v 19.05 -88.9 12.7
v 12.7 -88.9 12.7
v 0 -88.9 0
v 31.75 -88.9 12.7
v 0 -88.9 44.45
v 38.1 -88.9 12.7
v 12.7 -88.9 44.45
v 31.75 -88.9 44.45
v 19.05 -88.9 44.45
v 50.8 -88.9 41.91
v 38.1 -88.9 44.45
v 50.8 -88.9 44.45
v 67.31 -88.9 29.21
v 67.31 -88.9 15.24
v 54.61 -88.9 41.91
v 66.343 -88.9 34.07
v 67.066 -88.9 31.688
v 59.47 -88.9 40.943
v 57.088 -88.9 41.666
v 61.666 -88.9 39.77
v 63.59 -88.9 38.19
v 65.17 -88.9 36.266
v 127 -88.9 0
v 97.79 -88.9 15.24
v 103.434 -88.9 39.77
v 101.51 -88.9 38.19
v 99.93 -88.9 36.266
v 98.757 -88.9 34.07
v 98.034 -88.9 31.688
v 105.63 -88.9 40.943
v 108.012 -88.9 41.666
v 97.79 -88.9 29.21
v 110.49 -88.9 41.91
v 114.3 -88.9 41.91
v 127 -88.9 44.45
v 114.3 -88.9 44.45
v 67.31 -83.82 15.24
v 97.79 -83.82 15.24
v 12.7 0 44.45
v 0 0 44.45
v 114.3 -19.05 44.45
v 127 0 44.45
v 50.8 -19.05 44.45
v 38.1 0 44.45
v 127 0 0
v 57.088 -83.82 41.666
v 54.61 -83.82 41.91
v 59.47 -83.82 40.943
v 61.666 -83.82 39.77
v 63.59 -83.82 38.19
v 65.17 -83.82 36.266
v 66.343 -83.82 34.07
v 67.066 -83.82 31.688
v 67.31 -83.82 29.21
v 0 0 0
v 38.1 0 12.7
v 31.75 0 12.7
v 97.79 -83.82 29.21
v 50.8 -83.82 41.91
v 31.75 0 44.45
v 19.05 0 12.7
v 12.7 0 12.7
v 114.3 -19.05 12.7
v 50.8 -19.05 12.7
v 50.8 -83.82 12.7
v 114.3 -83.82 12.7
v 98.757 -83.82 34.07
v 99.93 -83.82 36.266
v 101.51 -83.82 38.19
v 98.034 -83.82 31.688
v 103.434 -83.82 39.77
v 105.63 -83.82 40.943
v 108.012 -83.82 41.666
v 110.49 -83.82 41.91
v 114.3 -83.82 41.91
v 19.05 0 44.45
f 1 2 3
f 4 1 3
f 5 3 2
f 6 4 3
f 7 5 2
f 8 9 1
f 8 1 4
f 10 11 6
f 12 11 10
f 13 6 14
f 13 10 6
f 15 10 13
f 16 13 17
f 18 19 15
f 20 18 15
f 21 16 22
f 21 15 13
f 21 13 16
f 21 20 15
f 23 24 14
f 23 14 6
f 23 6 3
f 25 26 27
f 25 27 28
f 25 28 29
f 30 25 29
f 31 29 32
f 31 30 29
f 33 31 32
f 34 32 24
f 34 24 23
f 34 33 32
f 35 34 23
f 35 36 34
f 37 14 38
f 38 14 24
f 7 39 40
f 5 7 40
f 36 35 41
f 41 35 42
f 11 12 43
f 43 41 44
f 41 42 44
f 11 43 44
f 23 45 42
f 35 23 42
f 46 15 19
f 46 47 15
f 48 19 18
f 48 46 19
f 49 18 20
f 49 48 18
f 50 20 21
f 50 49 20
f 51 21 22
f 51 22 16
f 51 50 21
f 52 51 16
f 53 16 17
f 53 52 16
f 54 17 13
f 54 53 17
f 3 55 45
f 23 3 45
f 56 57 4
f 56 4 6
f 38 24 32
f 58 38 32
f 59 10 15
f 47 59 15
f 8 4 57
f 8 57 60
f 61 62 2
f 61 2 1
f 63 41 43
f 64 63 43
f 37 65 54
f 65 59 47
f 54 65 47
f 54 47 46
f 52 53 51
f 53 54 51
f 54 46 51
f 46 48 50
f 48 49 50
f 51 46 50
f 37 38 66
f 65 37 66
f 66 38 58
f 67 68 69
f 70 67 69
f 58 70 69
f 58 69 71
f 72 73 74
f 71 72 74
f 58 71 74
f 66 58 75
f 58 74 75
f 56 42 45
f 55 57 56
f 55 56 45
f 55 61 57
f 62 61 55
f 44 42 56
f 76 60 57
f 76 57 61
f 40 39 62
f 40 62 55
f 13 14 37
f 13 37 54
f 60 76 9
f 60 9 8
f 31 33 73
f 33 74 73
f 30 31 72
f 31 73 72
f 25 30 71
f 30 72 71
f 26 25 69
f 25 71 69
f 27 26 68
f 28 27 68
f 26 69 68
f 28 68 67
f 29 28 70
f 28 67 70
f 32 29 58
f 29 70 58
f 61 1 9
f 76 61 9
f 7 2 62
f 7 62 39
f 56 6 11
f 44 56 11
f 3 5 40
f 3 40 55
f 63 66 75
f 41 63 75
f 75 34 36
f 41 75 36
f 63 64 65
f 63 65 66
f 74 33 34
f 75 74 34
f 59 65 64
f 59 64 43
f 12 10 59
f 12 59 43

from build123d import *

# Parameters (mm, degrees)
F0_W     = 127
F0_H     = 12.7
F1_DEPTH = 88.9
F2_W     = 12.7
F2_H     = 31.75
F3_DEPTH = 88.9
F4_W     = 16.51
F4_H     = 29.21
F5_DEPTH = 5.08
F6_W     = 63.5
F6_H     = 31.75
F7_DEPTH = 19.05
F8_W     = 30.48
F8_H     = 2.54
F9_DEPTH = 5.08
F10_R    = 12.7


with BuildPart() as f1:
    # F0 (on Front) → F1 (new body)
    with BuildSketch(Plane.XZ):
        with Locations((63.5, 6.35)):
            Rectangle(F0_W, F0_H)
    extrude(amount=F1_DEPTH)

    # F2 (on face) → F3 (join)
    with BuildSketch(Plane.XZ.offset(88.9)):
        Polygon((0, 44.45), (0, 12.7), (6.35, 12.7), (12.7, 12.7), (12.7, 44.45), (6.35, 44.45), align=None)
        with Locations((25.4, 28.575)):
            Rectangle(F2_W, F2_H)
        with Locations((44.45, 28.575)):
            Rectangle(F2_W, F2_H)
        with Locations((120.65, 28.575)):
            Rectangle(F2_W, F2_H)
    extrude(amount=-F3_DEPTH)

    # F4 (on face) → F5 (join)
    with BuildSketch(Plane.XZ.offset(88.9)):
        with Locations((59.055, 27.305)):
            Rectangle(F4_W, F4_H)
        with Locations((106.045, 27.305)):
            Rectangle(F4_W, F4_H)
    extrude(amount=-F5_DEPTH)

    # F6 (on face) → F7 (join)
    with BuildSketch(Plane(origin=(0, 0, 0), x_dir=(-1, 0, 0), z_dir=(0, 1, 0))):
        with Locations((-82.55, 28.575)):
            Rectangle(F6_W, F6_H)
    extrude(amount=-F7_DEPTH)

    # F8 (on face) → F9 (join)
    with BuildSketch(Plane.XZ.offset(88.9)):
        with Locations((82.55, 13.97)):
            Rectangle(F8_W, F8_H)
    extrude(amount=-F9_DEPTH)

    # F10
    f10_edges = [f1.edges().sort_by_distance(p)[0] for p in [
        (67.31, -86.36, 41.91),
        (97.79, -86.36, 41.91),
    ]]
    fillet(f10_edges, radius=F10_R)


solid = f1.part
